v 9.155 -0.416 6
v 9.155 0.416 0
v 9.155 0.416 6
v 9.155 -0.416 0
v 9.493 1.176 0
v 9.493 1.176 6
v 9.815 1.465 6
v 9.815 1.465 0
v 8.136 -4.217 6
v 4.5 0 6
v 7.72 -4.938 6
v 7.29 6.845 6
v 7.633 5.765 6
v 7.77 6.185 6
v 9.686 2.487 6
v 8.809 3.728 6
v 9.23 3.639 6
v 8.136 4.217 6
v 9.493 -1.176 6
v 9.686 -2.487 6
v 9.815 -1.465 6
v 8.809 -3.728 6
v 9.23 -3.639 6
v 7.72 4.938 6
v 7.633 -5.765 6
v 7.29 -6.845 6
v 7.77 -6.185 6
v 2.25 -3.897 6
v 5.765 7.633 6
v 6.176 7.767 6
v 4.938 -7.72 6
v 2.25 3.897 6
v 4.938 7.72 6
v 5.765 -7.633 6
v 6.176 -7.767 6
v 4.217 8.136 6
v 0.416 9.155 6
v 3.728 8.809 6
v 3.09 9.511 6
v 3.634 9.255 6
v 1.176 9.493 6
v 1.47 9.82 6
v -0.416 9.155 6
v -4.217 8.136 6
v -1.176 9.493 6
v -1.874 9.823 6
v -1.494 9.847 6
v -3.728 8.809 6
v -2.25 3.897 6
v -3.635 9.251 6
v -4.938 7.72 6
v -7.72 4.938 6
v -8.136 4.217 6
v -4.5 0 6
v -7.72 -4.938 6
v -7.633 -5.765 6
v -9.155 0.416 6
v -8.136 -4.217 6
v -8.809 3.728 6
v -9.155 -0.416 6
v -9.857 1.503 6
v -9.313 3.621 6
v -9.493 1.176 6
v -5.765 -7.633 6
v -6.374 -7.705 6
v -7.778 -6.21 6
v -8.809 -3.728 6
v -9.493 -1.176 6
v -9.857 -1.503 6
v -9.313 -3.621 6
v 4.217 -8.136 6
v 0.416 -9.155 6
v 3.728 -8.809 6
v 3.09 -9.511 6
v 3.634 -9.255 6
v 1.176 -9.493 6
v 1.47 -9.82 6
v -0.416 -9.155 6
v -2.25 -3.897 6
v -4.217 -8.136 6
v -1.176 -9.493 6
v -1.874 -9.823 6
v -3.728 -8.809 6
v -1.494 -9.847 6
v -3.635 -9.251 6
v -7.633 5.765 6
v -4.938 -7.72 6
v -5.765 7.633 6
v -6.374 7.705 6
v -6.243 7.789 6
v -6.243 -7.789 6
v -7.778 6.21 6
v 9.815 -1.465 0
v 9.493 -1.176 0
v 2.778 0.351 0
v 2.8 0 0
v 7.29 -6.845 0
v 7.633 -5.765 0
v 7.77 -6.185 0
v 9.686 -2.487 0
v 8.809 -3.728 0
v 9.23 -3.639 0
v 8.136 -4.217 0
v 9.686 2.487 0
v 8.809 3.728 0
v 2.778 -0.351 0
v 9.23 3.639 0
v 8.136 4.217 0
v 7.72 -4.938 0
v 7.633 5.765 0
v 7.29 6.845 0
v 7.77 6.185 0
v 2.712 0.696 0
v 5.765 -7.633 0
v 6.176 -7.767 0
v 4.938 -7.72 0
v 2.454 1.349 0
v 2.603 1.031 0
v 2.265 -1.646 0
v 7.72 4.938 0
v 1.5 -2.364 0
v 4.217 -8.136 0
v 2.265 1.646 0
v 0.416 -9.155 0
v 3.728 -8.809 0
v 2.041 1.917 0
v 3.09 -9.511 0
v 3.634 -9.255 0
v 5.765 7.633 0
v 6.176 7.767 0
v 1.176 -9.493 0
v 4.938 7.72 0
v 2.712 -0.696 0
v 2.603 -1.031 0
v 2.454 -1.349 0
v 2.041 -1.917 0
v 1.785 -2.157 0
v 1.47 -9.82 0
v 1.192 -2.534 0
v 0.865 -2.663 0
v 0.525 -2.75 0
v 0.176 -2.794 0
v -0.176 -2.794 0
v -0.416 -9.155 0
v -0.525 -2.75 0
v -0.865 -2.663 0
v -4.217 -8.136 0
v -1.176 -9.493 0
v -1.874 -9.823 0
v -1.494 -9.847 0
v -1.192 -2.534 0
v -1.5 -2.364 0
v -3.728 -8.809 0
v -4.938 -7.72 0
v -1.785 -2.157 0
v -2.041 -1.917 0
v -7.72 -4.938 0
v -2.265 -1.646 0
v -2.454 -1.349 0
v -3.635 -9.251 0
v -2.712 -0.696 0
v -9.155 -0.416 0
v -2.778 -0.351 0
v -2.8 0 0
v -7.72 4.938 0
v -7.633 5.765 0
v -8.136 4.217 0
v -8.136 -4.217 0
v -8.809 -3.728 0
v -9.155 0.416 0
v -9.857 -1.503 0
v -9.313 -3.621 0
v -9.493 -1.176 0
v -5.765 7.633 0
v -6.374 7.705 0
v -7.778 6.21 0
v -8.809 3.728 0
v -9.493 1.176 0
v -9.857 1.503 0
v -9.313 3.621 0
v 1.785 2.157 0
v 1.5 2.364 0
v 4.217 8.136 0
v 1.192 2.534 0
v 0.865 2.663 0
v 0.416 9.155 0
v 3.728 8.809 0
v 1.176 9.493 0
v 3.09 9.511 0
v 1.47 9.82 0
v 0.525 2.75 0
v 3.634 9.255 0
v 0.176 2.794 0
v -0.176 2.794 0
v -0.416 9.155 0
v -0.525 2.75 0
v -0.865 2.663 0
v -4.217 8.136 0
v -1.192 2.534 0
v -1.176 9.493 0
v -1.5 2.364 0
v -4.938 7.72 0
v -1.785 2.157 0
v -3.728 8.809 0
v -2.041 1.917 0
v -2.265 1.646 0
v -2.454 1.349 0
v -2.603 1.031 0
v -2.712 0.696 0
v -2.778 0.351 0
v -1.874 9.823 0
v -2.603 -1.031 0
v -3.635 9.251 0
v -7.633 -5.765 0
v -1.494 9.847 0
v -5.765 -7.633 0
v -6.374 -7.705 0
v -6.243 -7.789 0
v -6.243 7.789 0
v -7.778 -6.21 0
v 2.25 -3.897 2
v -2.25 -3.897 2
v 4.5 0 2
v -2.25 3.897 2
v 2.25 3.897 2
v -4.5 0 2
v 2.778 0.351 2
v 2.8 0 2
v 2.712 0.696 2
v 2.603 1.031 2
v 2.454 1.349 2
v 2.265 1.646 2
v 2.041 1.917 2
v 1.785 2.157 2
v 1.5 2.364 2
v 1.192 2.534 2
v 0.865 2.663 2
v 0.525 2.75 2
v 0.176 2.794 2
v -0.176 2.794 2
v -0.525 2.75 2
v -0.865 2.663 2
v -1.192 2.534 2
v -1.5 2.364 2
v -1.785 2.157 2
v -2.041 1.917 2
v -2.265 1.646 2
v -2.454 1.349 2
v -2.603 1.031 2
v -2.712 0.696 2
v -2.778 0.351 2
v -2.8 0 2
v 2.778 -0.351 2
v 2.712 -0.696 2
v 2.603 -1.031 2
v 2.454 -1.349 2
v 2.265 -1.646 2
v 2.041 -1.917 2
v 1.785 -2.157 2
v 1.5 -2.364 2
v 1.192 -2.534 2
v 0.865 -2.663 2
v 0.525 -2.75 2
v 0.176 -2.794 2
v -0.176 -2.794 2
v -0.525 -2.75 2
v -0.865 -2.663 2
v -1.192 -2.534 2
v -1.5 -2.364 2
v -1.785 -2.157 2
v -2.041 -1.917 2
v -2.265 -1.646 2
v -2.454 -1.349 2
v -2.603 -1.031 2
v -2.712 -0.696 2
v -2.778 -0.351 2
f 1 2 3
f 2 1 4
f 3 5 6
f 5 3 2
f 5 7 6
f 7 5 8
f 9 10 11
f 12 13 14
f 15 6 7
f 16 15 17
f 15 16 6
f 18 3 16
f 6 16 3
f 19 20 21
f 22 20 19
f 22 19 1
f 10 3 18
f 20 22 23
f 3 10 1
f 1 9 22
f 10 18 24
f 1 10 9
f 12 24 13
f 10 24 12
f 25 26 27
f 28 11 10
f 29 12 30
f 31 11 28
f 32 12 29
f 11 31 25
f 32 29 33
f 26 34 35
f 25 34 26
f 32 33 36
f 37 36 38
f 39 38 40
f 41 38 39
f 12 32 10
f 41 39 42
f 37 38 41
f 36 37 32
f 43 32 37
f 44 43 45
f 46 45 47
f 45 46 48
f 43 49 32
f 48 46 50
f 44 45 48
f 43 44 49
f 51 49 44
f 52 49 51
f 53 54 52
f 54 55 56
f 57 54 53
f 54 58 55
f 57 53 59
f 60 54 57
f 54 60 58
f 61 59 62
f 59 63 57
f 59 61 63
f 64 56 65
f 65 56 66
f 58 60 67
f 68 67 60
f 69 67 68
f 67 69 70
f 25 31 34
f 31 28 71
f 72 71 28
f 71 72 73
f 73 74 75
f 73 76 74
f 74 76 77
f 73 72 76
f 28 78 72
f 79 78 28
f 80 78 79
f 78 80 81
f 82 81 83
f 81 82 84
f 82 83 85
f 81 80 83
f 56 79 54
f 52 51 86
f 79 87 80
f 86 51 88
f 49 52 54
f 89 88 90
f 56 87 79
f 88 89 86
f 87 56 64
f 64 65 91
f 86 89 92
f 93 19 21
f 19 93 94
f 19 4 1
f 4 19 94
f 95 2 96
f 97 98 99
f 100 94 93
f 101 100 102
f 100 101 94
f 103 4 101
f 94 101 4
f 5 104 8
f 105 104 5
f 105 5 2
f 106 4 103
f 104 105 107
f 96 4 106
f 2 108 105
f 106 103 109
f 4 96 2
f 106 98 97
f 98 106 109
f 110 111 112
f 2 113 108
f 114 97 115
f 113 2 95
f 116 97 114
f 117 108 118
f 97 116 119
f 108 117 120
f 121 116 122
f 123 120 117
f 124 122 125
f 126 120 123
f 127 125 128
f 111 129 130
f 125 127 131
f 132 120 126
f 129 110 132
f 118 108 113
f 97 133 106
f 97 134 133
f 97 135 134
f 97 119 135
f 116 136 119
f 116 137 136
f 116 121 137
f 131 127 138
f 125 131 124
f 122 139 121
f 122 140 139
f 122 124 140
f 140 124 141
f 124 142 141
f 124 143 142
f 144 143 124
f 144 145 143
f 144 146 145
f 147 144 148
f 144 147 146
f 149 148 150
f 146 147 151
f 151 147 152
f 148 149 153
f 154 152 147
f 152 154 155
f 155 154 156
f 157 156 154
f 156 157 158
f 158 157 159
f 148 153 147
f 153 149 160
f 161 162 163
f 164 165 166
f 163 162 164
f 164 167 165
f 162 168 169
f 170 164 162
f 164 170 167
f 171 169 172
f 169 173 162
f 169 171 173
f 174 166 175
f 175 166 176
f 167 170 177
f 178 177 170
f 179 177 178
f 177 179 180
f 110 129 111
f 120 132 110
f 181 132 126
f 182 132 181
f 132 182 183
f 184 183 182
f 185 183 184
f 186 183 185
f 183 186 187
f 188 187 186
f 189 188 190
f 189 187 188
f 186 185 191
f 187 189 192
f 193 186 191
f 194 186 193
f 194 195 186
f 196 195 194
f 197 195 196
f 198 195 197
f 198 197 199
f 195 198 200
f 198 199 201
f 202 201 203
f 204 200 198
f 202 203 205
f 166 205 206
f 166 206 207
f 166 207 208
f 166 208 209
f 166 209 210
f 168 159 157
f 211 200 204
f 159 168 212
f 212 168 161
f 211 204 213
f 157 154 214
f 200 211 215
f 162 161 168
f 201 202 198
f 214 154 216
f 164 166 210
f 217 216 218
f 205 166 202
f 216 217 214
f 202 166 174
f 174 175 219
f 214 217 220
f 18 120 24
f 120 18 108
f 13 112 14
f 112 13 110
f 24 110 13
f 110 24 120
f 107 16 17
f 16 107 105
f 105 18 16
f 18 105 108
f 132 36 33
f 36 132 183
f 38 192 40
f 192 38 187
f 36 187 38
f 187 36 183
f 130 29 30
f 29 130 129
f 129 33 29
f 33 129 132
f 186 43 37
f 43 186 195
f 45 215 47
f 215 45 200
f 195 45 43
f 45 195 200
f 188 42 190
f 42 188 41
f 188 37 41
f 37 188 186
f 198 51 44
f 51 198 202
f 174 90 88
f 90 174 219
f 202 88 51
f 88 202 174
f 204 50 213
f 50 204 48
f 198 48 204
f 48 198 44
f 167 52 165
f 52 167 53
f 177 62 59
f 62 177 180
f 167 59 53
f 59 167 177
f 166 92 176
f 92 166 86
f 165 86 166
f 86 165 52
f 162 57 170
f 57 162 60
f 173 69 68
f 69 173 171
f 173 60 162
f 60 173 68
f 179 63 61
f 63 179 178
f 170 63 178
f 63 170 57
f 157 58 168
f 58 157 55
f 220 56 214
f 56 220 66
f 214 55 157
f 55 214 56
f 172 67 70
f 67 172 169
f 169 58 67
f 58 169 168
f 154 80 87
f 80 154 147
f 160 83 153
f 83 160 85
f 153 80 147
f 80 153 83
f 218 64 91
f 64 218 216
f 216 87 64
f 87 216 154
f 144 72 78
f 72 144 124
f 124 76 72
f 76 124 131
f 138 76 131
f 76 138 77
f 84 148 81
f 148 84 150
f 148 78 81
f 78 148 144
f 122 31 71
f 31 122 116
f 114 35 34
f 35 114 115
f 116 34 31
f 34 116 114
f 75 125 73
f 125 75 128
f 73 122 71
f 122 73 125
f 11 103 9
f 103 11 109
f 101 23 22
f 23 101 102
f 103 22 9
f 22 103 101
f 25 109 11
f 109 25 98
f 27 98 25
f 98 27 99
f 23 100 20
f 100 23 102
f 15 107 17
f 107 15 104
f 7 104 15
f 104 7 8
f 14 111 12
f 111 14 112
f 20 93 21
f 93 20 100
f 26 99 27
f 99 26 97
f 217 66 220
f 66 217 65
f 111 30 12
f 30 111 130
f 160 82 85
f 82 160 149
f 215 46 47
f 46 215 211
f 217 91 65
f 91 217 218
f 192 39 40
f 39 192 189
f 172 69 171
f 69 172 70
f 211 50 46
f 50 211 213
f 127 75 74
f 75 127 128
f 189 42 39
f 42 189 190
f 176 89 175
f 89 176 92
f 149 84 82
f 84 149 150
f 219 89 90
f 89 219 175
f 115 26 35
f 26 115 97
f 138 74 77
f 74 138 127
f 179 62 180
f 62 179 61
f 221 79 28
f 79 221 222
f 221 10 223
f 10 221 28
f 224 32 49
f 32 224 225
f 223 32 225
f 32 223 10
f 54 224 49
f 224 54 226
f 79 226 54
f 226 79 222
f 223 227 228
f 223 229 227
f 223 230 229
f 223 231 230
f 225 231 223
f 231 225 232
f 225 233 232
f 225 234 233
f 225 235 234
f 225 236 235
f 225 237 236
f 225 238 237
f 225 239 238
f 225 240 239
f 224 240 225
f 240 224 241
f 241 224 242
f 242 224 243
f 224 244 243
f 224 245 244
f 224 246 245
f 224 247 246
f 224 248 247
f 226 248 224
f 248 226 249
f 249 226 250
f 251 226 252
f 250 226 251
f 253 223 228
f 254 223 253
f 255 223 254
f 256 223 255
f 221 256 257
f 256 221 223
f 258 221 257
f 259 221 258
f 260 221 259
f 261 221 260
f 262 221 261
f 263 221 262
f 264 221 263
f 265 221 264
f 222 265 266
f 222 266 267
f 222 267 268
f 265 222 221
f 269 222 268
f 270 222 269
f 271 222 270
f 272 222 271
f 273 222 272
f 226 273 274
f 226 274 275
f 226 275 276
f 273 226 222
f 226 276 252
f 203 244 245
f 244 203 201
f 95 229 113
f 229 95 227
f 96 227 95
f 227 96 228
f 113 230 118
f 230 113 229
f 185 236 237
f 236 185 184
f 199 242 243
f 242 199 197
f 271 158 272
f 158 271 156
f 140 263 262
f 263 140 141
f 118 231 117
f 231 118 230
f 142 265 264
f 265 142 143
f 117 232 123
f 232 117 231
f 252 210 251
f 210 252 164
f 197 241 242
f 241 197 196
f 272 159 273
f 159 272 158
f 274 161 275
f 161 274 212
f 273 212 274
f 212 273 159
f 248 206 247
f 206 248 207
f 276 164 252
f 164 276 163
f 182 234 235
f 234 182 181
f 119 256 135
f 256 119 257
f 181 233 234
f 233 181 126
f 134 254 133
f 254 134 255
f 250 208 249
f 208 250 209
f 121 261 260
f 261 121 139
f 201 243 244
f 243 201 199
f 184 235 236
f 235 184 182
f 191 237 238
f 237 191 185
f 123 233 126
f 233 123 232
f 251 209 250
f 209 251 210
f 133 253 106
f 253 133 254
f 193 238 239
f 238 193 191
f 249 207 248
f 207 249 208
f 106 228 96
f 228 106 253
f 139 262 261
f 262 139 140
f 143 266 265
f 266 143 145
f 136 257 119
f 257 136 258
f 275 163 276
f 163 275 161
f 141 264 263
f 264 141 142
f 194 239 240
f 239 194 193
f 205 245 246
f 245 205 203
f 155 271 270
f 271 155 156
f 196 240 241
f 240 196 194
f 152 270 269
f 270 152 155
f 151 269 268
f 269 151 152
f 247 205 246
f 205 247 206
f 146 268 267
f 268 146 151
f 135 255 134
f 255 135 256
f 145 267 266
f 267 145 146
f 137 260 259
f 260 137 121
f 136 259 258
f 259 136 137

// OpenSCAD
// Knurled hex nut holder
// Glyn Cowles Feb 2015
// Modified by n800s, 2019

// Total diameter of knob
totd=20;
// Height of knob
height=6;
// Nut diameter (point to point not flat to flat)
nutd=9;
// Number of knurls
knurls=12;
// M?
bolt_d = 5;
// Bottom height
bottom_h = 2;

difference() {
    cylinder(h=height, d=totd, $fn=25);
    cylinder(h=height, d=nutd, $fn=6);
    for (r=[0:360/knurls:360]) {
        rotate([0,0,r]) translate([totd/1.8,0,0]) cylinder(h=height,r=(totd/5)/2,$fn=15);
    }
}
difference() {
	cylinder(h=bottom_h, d=nutd+(totd-nutd)/2, $fn=50);
	cylinder(h=bottom_h, d=bolt_d+0.6, $fn=50);
}
